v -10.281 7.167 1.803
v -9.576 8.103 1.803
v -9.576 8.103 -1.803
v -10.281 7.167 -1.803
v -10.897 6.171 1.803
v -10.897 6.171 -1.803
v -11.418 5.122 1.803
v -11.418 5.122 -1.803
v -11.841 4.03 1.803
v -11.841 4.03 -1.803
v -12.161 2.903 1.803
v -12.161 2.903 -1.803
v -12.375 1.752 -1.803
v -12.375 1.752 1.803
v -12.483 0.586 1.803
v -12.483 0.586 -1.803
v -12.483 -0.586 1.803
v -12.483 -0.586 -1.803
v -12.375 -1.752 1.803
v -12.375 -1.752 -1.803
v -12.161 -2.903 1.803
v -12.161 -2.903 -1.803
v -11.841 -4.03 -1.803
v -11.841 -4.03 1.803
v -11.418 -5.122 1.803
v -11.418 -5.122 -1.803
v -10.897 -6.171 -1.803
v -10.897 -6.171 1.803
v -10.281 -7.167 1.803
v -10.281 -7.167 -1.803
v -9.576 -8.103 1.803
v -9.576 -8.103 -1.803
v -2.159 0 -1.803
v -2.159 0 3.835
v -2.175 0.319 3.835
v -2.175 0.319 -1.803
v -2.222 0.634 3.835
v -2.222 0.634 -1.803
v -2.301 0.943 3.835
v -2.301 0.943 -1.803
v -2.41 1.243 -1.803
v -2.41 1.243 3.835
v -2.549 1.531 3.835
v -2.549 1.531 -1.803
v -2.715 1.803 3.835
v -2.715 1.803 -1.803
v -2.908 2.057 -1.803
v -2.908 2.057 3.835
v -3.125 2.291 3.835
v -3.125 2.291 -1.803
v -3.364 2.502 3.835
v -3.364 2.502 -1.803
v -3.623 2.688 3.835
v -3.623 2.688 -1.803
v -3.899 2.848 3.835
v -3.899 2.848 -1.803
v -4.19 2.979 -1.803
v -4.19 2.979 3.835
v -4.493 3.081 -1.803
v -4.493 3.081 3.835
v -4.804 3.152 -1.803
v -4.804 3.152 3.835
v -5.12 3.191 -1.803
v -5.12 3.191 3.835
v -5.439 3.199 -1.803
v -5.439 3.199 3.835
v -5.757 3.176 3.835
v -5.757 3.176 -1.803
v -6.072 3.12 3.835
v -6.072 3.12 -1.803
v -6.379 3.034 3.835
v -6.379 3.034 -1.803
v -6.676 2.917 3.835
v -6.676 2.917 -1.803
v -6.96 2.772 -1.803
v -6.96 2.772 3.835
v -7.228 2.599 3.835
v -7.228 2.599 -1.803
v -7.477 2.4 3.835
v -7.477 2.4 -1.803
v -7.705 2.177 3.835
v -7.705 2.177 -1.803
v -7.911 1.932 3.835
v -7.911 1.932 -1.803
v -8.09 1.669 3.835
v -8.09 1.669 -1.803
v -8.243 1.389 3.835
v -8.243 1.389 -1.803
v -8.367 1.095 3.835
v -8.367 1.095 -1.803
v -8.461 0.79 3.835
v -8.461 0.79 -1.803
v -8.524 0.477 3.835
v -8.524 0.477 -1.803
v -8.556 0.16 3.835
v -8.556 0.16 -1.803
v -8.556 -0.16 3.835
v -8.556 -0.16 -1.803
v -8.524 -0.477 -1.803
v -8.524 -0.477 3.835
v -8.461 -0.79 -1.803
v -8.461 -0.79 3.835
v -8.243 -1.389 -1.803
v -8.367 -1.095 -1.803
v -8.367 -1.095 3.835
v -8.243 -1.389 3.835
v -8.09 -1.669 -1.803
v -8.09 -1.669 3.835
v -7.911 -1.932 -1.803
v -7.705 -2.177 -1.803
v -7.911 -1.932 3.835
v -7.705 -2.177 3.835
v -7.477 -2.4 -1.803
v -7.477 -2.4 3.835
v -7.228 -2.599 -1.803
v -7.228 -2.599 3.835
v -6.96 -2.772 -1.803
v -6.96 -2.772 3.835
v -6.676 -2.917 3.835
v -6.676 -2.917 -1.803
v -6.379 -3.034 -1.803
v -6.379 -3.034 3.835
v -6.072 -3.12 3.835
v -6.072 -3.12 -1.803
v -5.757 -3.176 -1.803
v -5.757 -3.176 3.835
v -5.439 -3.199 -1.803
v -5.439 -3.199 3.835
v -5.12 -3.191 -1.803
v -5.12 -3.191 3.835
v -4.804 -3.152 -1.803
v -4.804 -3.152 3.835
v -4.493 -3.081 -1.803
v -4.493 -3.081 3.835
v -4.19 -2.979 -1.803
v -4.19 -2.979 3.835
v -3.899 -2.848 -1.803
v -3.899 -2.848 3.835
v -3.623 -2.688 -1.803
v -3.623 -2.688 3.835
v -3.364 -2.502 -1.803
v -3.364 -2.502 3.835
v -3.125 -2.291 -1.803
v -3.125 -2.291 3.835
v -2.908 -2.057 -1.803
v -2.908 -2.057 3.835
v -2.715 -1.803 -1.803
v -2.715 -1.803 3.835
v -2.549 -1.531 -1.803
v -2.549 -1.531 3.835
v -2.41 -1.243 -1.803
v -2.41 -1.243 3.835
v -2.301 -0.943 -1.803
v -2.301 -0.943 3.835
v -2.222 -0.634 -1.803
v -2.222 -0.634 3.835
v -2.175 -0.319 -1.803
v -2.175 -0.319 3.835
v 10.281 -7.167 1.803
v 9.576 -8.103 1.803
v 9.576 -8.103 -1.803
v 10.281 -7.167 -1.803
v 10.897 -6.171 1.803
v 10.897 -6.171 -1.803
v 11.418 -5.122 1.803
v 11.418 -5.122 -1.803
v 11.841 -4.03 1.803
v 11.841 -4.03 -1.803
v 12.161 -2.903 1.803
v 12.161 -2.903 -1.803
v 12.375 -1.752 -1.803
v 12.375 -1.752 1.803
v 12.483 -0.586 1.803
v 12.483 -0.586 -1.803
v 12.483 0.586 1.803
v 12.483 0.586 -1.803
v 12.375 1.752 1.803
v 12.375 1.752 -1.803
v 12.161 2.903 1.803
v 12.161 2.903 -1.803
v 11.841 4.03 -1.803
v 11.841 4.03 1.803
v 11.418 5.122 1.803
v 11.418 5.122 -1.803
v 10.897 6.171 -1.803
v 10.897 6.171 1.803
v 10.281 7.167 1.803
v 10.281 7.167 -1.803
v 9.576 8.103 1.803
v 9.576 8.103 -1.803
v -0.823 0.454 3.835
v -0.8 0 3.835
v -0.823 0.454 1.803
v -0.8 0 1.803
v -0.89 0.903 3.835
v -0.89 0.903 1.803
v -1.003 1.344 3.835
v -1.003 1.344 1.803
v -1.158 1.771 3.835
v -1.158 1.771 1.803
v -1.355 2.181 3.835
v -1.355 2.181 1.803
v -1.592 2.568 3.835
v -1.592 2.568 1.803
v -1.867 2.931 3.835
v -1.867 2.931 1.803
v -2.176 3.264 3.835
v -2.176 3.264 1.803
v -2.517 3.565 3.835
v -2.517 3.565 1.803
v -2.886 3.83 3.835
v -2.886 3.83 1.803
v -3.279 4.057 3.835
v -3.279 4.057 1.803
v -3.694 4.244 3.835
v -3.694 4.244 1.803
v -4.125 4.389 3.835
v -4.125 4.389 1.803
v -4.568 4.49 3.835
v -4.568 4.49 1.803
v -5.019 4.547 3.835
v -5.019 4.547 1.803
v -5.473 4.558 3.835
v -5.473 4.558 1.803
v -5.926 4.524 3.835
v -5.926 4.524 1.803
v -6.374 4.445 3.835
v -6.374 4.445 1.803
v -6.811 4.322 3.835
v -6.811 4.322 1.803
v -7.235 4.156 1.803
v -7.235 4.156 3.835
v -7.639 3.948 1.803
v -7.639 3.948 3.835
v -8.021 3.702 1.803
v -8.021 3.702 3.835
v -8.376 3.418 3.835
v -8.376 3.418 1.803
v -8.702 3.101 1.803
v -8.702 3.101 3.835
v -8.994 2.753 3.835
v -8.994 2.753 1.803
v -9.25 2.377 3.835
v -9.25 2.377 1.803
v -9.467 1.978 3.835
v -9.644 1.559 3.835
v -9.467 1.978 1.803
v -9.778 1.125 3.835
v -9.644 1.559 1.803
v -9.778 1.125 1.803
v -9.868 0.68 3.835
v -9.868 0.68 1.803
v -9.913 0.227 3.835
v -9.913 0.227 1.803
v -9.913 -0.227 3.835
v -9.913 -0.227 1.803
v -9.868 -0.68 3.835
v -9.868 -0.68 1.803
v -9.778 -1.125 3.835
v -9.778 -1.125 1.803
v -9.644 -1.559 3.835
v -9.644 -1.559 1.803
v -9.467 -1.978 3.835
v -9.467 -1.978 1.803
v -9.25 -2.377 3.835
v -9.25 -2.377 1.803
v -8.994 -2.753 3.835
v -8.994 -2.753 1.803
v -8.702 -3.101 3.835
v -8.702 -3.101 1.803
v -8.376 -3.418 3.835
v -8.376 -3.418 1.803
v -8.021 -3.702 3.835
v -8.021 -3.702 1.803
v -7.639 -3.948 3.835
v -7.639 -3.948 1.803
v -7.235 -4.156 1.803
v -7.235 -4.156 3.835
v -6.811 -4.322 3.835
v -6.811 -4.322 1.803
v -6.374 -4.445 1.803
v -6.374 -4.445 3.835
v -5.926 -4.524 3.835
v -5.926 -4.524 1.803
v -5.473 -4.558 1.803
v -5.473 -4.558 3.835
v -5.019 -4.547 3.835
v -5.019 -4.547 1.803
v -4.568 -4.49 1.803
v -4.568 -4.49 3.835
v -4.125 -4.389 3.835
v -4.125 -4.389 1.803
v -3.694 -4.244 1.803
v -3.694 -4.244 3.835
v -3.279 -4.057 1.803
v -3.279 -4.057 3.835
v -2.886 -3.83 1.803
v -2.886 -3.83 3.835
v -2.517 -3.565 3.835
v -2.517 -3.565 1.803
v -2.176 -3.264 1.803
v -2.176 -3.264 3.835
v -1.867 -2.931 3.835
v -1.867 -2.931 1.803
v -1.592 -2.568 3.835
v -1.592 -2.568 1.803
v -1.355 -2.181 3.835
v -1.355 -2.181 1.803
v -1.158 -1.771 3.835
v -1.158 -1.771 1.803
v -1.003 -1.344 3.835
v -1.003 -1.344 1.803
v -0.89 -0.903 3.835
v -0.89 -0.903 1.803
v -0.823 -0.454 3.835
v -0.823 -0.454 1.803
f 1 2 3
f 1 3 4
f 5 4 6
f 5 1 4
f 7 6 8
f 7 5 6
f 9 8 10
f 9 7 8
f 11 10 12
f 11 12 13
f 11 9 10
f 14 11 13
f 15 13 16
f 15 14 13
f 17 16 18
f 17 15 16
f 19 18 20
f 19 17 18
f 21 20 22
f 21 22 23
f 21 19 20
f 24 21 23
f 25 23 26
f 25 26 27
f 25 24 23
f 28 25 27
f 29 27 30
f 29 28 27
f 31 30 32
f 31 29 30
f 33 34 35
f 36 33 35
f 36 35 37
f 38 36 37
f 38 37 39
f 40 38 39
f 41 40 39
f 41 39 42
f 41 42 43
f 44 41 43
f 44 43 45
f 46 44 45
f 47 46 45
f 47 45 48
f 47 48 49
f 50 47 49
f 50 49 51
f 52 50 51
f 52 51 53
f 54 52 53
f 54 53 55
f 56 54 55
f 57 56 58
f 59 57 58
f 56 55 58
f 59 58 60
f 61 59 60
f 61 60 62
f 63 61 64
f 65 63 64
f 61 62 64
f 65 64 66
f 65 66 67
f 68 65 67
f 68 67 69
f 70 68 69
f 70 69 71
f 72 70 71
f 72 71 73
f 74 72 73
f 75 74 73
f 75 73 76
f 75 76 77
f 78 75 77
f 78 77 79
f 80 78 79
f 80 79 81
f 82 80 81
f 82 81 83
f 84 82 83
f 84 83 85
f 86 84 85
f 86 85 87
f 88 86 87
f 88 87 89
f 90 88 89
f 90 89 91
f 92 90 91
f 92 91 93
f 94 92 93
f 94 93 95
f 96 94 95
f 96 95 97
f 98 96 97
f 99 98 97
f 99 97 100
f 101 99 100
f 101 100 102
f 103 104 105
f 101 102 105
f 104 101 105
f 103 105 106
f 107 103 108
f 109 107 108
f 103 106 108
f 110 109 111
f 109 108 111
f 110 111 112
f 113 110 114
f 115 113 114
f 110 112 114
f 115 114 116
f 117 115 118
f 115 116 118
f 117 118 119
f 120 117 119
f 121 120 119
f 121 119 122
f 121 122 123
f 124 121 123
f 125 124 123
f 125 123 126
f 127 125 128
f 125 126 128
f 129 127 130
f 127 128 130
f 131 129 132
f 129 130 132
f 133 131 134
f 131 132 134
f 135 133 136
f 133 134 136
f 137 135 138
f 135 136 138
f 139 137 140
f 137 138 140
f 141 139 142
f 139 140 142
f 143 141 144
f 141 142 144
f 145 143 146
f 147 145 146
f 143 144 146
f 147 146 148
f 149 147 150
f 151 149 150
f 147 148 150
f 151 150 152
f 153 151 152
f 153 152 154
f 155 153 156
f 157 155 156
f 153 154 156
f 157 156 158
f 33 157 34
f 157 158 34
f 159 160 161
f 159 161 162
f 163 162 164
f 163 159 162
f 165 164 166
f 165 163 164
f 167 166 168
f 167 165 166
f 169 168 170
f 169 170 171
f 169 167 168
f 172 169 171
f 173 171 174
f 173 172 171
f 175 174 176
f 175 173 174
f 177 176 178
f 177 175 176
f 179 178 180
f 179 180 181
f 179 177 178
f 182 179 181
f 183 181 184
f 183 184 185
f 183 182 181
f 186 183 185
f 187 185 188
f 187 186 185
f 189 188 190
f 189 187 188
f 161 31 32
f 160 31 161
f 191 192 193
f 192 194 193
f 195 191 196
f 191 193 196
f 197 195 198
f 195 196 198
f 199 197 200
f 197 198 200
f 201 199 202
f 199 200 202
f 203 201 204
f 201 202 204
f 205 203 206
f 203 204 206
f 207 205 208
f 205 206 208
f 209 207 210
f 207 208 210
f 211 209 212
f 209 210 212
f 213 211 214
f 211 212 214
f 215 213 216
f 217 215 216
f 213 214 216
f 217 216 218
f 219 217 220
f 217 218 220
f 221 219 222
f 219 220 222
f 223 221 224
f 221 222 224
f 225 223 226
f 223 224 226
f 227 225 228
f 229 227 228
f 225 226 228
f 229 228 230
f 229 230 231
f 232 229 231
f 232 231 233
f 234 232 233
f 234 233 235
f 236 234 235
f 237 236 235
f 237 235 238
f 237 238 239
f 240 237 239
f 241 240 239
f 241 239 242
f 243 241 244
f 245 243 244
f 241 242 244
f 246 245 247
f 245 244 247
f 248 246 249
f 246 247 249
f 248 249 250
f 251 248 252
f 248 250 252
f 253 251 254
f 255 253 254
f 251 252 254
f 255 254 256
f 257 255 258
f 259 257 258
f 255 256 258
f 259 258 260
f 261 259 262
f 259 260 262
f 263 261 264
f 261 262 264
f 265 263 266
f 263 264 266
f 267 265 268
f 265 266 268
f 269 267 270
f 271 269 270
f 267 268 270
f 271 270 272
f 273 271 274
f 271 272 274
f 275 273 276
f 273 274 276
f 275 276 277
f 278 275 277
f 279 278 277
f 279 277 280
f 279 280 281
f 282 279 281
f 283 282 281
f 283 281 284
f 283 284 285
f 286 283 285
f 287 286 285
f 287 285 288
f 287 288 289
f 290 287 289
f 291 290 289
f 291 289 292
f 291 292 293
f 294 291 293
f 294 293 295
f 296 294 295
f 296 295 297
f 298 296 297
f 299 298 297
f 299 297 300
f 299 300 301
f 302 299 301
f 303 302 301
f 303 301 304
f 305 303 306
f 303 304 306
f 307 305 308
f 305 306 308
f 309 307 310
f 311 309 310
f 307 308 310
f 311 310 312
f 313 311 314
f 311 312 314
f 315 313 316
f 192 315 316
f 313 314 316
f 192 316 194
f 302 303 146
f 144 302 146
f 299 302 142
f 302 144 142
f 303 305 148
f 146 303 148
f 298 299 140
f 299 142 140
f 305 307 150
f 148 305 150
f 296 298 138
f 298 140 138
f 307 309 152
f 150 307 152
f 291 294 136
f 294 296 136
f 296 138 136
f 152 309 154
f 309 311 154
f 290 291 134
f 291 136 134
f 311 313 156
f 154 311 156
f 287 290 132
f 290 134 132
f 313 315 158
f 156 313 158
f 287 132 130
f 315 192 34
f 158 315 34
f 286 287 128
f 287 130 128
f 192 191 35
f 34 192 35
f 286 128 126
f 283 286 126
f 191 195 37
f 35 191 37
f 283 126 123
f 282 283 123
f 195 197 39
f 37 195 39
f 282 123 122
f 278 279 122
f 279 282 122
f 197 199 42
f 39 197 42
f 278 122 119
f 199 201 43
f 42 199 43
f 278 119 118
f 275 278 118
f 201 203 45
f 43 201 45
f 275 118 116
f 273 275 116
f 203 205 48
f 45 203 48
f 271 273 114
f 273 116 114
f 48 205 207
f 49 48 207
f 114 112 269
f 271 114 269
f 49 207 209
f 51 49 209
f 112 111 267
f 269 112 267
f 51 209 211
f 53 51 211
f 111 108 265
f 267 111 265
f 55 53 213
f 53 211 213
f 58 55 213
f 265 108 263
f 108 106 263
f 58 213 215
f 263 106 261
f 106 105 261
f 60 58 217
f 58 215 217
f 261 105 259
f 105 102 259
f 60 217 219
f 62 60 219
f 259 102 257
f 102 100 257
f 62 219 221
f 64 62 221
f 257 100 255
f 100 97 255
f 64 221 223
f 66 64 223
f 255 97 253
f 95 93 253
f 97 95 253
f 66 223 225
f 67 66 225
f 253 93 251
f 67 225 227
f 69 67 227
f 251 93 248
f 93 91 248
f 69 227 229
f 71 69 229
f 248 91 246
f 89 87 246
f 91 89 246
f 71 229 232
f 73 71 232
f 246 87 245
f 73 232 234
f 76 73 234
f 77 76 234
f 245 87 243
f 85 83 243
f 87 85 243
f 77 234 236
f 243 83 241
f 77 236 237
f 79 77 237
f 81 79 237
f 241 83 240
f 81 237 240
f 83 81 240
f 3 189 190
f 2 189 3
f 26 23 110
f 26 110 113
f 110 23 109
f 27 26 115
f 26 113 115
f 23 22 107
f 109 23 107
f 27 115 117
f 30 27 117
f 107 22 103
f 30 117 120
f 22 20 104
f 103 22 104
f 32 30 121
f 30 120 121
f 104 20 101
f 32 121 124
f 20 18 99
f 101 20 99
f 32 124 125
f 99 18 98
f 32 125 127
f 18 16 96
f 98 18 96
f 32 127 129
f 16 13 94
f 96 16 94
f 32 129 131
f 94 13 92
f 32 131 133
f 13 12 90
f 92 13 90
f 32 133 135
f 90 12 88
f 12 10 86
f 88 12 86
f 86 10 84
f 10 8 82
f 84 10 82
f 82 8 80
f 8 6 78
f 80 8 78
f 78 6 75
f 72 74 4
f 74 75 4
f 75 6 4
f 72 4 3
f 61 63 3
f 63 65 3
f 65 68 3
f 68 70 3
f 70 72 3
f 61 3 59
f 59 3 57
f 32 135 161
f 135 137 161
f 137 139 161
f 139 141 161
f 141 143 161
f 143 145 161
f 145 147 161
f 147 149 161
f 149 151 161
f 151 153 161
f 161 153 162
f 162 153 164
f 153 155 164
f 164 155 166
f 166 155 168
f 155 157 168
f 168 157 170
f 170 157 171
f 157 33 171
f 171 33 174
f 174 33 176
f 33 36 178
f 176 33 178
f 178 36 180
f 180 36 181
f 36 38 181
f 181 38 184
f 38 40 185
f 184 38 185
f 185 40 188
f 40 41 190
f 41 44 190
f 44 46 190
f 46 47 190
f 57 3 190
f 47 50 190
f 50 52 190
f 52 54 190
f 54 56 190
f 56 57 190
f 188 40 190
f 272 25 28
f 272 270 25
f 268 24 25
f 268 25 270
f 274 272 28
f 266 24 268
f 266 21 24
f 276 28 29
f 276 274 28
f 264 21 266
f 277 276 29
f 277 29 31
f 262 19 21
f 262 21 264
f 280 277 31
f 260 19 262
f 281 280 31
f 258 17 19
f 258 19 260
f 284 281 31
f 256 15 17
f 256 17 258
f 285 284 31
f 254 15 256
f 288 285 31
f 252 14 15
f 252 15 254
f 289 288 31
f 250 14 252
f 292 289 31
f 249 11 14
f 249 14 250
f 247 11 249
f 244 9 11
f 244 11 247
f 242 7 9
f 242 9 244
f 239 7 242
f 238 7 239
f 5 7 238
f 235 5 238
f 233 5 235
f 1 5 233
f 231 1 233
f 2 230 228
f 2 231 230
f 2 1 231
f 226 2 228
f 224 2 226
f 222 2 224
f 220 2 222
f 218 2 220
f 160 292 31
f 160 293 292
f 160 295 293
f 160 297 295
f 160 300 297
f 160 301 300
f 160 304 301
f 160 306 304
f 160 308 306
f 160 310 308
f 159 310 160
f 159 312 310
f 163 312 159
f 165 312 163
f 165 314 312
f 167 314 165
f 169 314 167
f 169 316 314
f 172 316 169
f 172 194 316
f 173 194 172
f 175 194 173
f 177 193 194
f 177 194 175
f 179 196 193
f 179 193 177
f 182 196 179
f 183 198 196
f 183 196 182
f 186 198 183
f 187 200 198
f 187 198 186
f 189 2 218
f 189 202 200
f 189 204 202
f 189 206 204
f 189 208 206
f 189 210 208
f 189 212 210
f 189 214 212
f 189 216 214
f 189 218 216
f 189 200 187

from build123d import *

# Parameters (mm, degrees)
BOSS_EXTRUDE1_DEPTH = 3.6068
SKETCH2_W           = 4.5593
SKETCH2_H           = 2.032
HOLE1_D             = 6.4008
HOLE1_DEPTH         = 5.6388


with BuildPart() as part:
    # Sketch1 → Boss-Extrude1 (new body)
    with BuildSketch(Plane.XY.offset(1.8034)):
        with BuildLine():
            Line((9.576261807, 8.1026), (-9.576261807, 8.1026))
            ThreePointArc((-9.576261807, 8.1026), (-12.4968, 0), (-9.576261807, -8.1026))
            Line((-9.576261807, -8.1026), (9.576261807, -8.1026))
            ThreePointArc((9.576261807, -8.1026), (12.4968, 0), (9.576261807, 8.1026))
        make_face()
    extrude(amount=-BOSS_EXTRUDE1_DEPTH)

    # Sketch2 → Revolve1 (revolve)
    with BuildSketch(Plane(origin=(0, 0, 0), x_dir=(1, 0, 0), z_dir=(0, 1, 0))):
        with Locations((-3.07975, -2.8194)):
            Rectangle(SKETCH2_W, SKETCH2_H)
    revolve(axis=Axis((-5.3594, 0, 1.8034), (0, 0, 1)))

    # Hole1
    with Locations(Plane(origin=(0, 0, -1.8034), x_dir=(-1, 0, 0), z_dir=(0, 0, -1))):
        with Locations((5.3594, 0)):
            Hole(HOLE1_D / 2, depth=HOLE1_DEPTH)


solid = part.part
